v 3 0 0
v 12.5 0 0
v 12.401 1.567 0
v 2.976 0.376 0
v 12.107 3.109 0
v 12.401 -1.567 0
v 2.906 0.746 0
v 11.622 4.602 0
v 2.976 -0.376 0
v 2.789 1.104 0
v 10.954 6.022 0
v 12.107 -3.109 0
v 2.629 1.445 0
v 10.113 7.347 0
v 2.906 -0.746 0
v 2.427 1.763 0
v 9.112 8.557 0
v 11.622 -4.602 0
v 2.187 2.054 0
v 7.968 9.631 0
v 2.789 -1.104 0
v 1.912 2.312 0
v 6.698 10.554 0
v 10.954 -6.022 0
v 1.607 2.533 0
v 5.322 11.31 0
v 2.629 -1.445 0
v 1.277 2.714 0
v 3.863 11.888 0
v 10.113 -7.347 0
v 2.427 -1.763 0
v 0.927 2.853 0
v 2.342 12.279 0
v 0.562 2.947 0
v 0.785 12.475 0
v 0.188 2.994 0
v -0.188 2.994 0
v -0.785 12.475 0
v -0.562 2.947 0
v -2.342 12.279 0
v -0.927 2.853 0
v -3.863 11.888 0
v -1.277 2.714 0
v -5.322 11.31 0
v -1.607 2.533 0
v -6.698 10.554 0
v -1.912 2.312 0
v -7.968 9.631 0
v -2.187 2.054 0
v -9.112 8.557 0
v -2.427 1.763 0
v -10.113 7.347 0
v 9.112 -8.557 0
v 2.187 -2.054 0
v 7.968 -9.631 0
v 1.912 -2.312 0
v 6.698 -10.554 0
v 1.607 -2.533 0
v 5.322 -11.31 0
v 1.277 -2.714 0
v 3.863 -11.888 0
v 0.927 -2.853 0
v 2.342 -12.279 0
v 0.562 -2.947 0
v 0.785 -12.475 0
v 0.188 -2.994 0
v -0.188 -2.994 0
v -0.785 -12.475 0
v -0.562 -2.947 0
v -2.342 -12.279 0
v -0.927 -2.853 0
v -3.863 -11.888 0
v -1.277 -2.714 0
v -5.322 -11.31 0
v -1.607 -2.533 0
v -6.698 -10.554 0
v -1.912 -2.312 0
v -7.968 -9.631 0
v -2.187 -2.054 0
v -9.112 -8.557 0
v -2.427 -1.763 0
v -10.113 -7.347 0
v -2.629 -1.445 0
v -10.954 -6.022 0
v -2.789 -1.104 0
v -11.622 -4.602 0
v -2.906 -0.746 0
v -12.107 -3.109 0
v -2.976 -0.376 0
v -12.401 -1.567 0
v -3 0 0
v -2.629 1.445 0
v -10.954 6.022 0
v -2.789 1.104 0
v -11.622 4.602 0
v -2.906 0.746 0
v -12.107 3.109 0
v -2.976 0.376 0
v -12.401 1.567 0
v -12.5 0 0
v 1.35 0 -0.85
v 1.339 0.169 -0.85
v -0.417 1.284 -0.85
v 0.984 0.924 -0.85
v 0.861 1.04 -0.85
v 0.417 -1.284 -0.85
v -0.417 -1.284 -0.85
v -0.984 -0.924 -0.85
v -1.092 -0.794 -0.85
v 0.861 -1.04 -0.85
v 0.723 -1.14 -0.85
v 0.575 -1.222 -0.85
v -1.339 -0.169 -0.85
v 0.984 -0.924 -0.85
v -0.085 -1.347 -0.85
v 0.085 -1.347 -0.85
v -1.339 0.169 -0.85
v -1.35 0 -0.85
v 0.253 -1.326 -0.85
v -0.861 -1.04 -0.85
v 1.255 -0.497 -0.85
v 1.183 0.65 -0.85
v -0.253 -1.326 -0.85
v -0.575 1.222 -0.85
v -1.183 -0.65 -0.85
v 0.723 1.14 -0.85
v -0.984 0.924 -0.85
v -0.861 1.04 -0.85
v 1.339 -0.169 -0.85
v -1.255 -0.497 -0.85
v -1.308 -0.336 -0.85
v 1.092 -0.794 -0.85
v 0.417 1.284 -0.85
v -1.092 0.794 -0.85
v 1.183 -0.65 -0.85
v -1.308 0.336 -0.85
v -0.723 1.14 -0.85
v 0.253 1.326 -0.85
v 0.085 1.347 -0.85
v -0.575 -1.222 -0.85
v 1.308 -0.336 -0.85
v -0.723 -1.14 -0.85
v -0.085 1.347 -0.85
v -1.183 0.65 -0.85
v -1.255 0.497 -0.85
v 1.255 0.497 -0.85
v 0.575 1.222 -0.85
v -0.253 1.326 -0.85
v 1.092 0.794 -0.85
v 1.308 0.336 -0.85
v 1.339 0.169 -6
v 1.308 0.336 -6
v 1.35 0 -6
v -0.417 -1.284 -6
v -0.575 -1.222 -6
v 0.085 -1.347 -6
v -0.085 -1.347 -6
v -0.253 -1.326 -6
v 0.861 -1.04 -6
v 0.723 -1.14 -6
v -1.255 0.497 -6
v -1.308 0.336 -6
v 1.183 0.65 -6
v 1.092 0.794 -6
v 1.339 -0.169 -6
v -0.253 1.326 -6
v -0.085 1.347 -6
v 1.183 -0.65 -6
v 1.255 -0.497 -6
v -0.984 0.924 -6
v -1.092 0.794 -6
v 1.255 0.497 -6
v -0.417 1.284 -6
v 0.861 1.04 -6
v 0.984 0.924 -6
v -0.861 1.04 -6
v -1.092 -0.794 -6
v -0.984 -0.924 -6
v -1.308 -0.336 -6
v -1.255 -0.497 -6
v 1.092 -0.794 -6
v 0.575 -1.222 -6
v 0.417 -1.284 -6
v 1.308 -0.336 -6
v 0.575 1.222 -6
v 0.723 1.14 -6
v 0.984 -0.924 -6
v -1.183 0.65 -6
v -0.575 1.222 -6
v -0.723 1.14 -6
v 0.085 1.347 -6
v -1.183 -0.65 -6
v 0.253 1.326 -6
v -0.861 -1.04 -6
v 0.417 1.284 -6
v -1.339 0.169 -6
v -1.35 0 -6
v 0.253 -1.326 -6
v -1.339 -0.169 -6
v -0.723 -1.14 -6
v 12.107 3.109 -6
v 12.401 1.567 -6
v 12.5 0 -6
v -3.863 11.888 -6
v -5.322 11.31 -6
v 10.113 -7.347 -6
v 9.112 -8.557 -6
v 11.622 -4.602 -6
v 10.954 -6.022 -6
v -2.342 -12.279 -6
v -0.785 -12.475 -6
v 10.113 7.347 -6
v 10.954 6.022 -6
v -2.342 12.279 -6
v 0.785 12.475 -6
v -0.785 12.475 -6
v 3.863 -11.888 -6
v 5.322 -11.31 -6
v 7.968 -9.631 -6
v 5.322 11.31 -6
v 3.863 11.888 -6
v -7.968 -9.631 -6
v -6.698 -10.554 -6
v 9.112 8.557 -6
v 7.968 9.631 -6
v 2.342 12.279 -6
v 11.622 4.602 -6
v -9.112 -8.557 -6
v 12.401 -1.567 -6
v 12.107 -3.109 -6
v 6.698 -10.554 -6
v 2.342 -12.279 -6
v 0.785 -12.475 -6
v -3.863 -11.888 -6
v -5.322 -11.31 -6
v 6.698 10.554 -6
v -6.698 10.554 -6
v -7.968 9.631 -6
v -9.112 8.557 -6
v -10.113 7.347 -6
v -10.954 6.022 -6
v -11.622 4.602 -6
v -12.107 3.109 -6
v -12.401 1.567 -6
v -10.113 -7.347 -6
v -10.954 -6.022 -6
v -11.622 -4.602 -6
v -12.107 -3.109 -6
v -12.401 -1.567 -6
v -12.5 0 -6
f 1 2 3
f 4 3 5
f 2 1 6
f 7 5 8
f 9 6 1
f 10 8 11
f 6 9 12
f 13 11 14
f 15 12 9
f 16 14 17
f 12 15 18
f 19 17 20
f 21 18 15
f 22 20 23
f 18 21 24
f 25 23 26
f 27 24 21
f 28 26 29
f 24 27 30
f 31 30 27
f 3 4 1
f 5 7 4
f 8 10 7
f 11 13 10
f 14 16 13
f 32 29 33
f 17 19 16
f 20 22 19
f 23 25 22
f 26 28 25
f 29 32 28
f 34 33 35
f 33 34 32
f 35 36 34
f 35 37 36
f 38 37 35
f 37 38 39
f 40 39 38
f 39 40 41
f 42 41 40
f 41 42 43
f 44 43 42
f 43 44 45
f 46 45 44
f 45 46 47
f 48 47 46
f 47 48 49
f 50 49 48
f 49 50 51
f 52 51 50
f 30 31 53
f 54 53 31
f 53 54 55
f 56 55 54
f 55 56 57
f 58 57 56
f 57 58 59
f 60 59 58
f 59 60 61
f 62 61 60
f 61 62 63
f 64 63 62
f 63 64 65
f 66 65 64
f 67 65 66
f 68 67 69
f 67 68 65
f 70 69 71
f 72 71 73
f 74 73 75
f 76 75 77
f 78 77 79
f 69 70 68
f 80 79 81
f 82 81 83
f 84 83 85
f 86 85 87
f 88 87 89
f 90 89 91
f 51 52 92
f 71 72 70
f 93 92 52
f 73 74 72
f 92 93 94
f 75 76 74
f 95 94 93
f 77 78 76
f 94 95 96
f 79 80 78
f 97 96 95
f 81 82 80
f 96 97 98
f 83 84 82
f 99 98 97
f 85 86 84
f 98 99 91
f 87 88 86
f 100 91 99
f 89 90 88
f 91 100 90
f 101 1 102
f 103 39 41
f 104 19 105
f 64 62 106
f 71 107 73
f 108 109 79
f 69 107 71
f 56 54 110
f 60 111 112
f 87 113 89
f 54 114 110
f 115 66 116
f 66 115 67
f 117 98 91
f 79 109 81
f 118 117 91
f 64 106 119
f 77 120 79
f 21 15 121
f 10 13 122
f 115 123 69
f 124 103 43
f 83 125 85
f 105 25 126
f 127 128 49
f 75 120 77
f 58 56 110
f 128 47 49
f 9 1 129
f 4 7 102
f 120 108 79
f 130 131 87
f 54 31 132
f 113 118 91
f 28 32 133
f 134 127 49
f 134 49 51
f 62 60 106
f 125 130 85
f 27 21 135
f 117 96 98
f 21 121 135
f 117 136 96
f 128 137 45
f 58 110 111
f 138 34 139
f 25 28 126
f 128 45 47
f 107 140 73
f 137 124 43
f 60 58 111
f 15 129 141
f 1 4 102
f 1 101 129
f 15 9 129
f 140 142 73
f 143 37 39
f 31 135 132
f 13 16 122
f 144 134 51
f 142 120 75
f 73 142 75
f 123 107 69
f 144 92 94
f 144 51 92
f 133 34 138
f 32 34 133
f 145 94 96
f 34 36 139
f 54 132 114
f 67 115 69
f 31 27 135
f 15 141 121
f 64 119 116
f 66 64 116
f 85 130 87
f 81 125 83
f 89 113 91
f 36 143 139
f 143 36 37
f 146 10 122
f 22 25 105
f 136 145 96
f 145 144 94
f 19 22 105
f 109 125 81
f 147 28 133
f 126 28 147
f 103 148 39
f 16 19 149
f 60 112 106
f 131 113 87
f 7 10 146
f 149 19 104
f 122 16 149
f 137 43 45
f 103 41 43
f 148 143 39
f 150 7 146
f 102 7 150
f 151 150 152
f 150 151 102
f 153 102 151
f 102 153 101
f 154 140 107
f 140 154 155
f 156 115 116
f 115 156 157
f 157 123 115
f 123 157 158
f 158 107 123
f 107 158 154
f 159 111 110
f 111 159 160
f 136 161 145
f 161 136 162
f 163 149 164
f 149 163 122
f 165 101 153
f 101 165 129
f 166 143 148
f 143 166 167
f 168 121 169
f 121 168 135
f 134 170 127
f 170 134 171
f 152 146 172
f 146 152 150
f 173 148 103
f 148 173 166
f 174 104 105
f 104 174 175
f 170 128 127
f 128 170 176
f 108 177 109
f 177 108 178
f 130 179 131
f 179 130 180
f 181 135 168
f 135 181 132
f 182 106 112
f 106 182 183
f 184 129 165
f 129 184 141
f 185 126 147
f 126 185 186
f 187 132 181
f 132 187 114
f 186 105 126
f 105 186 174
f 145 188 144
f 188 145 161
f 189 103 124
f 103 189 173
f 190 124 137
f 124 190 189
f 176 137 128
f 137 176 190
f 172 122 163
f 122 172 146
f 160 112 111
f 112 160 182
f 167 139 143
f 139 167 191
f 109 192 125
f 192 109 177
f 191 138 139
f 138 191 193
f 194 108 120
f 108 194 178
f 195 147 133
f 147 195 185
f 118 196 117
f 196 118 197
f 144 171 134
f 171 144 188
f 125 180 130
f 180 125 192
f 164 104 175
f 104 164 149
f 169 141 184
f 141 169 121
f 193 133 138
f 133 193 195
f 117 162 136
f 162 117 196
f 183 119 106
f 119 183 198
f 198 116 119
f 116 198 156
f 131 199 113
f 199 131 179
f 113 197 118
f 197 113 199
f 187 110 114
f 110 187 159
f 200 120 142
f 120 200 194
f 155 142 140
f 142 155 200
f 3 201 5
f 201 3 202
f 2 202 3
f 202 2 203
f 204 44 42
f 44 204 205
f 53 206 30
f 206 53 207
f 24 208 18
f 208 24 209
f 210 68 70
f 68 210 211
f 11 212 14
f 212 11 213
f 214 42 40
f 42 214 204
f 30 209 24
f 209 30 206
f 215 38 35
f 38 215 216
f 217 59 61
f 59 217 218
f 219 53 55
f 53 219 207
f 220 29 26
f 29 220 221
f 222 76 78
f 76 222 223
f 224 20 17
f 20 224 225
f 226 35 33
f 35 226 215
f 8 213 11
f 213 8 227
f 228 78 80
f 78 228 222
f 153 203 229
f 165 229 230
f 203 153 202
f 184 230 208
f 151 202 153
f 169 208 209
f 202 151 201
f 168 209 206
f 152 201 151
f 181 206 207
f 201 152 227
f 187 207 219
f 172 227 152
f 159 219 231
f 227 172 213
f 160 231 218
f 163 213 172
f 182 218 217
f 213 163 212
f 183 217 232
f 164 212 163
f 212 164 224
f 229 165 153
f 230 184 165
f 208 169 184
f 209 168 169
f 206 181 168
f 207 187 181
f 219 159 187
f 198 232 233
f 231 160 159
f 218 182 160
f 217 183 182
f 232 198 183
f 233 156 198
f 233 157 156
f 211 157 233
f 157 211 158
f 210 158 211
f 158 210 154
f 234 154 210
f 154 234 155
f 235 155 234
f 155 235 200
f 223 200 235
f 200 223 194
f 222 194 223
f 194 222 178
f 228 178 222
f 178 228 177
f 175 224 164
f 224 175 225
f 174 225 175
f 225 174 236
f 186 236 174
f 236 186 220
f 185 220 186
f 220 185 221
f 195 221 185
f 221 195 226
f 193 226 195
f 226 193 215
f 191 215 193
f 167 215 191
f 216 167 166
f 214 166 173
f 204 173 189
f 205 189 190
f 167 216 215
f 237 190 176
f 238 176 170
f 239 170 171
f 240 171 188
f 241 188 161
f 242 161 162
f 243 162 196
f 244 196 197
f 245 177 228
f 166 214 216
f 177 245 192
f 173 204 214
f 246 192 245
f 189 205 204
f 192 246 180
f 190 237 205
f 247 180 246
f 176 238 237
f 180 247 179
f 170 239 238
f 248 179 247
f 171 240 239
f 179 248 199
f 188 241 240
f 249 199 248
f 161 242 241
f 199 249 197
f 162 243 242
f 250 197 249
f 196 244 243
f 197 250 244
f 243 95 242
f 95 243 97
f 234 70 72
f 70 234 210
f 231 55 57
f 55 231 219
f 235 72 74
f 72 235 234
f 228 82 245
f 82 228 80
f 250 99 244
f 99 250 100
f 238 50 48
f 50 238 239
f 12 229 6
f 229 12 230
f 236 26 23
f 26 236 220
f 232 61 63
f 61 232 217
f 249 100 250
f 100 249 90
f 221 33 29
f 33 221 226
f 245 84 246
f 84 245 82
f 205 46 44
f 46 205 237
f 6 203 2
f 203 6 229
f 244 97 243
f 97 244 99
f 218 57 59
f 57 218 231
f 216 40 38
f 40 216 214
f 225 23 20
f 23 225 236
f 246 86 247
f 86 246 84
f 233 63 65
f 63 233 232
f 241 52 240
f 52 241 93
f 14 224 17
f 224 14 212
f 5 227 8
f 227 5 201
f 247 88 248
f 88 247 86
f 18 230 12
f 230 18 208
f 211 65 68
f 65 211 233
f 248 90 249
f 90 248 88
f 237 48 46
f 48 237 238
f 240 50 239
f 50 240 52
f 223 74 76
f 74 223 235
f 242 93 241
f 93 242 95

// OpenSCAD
$fn = 50;

difference() {
	union() {
		translate(v = [0, 0, -6.0]) {
			cylinder(h = 6, r = 12.5);
		}
	}
	union() {
		translate(v = [0, 0, 0]) {
			rotate(a = [0, 0, 0]) {
				difference() {
					union() {
						translate(v = [0, 0, -9.0]) {
							cylinder(h = 9, r = 1.0);
						}
						translate(v = [0, 0, -0.85]) {
							cylinder(h = 0.85, r1 = 1.35, r2 = 3.0);
						}
						translate(v = [0, 0, -9.0]) {
							cylinder(h = 9, r = 1.35);
						}
						translate(v = [0, 0, -9.0]) {
							cylinder(h = 9, r = 1.0);
						}
					}
					union();
				}
			}
		}
	}
}
